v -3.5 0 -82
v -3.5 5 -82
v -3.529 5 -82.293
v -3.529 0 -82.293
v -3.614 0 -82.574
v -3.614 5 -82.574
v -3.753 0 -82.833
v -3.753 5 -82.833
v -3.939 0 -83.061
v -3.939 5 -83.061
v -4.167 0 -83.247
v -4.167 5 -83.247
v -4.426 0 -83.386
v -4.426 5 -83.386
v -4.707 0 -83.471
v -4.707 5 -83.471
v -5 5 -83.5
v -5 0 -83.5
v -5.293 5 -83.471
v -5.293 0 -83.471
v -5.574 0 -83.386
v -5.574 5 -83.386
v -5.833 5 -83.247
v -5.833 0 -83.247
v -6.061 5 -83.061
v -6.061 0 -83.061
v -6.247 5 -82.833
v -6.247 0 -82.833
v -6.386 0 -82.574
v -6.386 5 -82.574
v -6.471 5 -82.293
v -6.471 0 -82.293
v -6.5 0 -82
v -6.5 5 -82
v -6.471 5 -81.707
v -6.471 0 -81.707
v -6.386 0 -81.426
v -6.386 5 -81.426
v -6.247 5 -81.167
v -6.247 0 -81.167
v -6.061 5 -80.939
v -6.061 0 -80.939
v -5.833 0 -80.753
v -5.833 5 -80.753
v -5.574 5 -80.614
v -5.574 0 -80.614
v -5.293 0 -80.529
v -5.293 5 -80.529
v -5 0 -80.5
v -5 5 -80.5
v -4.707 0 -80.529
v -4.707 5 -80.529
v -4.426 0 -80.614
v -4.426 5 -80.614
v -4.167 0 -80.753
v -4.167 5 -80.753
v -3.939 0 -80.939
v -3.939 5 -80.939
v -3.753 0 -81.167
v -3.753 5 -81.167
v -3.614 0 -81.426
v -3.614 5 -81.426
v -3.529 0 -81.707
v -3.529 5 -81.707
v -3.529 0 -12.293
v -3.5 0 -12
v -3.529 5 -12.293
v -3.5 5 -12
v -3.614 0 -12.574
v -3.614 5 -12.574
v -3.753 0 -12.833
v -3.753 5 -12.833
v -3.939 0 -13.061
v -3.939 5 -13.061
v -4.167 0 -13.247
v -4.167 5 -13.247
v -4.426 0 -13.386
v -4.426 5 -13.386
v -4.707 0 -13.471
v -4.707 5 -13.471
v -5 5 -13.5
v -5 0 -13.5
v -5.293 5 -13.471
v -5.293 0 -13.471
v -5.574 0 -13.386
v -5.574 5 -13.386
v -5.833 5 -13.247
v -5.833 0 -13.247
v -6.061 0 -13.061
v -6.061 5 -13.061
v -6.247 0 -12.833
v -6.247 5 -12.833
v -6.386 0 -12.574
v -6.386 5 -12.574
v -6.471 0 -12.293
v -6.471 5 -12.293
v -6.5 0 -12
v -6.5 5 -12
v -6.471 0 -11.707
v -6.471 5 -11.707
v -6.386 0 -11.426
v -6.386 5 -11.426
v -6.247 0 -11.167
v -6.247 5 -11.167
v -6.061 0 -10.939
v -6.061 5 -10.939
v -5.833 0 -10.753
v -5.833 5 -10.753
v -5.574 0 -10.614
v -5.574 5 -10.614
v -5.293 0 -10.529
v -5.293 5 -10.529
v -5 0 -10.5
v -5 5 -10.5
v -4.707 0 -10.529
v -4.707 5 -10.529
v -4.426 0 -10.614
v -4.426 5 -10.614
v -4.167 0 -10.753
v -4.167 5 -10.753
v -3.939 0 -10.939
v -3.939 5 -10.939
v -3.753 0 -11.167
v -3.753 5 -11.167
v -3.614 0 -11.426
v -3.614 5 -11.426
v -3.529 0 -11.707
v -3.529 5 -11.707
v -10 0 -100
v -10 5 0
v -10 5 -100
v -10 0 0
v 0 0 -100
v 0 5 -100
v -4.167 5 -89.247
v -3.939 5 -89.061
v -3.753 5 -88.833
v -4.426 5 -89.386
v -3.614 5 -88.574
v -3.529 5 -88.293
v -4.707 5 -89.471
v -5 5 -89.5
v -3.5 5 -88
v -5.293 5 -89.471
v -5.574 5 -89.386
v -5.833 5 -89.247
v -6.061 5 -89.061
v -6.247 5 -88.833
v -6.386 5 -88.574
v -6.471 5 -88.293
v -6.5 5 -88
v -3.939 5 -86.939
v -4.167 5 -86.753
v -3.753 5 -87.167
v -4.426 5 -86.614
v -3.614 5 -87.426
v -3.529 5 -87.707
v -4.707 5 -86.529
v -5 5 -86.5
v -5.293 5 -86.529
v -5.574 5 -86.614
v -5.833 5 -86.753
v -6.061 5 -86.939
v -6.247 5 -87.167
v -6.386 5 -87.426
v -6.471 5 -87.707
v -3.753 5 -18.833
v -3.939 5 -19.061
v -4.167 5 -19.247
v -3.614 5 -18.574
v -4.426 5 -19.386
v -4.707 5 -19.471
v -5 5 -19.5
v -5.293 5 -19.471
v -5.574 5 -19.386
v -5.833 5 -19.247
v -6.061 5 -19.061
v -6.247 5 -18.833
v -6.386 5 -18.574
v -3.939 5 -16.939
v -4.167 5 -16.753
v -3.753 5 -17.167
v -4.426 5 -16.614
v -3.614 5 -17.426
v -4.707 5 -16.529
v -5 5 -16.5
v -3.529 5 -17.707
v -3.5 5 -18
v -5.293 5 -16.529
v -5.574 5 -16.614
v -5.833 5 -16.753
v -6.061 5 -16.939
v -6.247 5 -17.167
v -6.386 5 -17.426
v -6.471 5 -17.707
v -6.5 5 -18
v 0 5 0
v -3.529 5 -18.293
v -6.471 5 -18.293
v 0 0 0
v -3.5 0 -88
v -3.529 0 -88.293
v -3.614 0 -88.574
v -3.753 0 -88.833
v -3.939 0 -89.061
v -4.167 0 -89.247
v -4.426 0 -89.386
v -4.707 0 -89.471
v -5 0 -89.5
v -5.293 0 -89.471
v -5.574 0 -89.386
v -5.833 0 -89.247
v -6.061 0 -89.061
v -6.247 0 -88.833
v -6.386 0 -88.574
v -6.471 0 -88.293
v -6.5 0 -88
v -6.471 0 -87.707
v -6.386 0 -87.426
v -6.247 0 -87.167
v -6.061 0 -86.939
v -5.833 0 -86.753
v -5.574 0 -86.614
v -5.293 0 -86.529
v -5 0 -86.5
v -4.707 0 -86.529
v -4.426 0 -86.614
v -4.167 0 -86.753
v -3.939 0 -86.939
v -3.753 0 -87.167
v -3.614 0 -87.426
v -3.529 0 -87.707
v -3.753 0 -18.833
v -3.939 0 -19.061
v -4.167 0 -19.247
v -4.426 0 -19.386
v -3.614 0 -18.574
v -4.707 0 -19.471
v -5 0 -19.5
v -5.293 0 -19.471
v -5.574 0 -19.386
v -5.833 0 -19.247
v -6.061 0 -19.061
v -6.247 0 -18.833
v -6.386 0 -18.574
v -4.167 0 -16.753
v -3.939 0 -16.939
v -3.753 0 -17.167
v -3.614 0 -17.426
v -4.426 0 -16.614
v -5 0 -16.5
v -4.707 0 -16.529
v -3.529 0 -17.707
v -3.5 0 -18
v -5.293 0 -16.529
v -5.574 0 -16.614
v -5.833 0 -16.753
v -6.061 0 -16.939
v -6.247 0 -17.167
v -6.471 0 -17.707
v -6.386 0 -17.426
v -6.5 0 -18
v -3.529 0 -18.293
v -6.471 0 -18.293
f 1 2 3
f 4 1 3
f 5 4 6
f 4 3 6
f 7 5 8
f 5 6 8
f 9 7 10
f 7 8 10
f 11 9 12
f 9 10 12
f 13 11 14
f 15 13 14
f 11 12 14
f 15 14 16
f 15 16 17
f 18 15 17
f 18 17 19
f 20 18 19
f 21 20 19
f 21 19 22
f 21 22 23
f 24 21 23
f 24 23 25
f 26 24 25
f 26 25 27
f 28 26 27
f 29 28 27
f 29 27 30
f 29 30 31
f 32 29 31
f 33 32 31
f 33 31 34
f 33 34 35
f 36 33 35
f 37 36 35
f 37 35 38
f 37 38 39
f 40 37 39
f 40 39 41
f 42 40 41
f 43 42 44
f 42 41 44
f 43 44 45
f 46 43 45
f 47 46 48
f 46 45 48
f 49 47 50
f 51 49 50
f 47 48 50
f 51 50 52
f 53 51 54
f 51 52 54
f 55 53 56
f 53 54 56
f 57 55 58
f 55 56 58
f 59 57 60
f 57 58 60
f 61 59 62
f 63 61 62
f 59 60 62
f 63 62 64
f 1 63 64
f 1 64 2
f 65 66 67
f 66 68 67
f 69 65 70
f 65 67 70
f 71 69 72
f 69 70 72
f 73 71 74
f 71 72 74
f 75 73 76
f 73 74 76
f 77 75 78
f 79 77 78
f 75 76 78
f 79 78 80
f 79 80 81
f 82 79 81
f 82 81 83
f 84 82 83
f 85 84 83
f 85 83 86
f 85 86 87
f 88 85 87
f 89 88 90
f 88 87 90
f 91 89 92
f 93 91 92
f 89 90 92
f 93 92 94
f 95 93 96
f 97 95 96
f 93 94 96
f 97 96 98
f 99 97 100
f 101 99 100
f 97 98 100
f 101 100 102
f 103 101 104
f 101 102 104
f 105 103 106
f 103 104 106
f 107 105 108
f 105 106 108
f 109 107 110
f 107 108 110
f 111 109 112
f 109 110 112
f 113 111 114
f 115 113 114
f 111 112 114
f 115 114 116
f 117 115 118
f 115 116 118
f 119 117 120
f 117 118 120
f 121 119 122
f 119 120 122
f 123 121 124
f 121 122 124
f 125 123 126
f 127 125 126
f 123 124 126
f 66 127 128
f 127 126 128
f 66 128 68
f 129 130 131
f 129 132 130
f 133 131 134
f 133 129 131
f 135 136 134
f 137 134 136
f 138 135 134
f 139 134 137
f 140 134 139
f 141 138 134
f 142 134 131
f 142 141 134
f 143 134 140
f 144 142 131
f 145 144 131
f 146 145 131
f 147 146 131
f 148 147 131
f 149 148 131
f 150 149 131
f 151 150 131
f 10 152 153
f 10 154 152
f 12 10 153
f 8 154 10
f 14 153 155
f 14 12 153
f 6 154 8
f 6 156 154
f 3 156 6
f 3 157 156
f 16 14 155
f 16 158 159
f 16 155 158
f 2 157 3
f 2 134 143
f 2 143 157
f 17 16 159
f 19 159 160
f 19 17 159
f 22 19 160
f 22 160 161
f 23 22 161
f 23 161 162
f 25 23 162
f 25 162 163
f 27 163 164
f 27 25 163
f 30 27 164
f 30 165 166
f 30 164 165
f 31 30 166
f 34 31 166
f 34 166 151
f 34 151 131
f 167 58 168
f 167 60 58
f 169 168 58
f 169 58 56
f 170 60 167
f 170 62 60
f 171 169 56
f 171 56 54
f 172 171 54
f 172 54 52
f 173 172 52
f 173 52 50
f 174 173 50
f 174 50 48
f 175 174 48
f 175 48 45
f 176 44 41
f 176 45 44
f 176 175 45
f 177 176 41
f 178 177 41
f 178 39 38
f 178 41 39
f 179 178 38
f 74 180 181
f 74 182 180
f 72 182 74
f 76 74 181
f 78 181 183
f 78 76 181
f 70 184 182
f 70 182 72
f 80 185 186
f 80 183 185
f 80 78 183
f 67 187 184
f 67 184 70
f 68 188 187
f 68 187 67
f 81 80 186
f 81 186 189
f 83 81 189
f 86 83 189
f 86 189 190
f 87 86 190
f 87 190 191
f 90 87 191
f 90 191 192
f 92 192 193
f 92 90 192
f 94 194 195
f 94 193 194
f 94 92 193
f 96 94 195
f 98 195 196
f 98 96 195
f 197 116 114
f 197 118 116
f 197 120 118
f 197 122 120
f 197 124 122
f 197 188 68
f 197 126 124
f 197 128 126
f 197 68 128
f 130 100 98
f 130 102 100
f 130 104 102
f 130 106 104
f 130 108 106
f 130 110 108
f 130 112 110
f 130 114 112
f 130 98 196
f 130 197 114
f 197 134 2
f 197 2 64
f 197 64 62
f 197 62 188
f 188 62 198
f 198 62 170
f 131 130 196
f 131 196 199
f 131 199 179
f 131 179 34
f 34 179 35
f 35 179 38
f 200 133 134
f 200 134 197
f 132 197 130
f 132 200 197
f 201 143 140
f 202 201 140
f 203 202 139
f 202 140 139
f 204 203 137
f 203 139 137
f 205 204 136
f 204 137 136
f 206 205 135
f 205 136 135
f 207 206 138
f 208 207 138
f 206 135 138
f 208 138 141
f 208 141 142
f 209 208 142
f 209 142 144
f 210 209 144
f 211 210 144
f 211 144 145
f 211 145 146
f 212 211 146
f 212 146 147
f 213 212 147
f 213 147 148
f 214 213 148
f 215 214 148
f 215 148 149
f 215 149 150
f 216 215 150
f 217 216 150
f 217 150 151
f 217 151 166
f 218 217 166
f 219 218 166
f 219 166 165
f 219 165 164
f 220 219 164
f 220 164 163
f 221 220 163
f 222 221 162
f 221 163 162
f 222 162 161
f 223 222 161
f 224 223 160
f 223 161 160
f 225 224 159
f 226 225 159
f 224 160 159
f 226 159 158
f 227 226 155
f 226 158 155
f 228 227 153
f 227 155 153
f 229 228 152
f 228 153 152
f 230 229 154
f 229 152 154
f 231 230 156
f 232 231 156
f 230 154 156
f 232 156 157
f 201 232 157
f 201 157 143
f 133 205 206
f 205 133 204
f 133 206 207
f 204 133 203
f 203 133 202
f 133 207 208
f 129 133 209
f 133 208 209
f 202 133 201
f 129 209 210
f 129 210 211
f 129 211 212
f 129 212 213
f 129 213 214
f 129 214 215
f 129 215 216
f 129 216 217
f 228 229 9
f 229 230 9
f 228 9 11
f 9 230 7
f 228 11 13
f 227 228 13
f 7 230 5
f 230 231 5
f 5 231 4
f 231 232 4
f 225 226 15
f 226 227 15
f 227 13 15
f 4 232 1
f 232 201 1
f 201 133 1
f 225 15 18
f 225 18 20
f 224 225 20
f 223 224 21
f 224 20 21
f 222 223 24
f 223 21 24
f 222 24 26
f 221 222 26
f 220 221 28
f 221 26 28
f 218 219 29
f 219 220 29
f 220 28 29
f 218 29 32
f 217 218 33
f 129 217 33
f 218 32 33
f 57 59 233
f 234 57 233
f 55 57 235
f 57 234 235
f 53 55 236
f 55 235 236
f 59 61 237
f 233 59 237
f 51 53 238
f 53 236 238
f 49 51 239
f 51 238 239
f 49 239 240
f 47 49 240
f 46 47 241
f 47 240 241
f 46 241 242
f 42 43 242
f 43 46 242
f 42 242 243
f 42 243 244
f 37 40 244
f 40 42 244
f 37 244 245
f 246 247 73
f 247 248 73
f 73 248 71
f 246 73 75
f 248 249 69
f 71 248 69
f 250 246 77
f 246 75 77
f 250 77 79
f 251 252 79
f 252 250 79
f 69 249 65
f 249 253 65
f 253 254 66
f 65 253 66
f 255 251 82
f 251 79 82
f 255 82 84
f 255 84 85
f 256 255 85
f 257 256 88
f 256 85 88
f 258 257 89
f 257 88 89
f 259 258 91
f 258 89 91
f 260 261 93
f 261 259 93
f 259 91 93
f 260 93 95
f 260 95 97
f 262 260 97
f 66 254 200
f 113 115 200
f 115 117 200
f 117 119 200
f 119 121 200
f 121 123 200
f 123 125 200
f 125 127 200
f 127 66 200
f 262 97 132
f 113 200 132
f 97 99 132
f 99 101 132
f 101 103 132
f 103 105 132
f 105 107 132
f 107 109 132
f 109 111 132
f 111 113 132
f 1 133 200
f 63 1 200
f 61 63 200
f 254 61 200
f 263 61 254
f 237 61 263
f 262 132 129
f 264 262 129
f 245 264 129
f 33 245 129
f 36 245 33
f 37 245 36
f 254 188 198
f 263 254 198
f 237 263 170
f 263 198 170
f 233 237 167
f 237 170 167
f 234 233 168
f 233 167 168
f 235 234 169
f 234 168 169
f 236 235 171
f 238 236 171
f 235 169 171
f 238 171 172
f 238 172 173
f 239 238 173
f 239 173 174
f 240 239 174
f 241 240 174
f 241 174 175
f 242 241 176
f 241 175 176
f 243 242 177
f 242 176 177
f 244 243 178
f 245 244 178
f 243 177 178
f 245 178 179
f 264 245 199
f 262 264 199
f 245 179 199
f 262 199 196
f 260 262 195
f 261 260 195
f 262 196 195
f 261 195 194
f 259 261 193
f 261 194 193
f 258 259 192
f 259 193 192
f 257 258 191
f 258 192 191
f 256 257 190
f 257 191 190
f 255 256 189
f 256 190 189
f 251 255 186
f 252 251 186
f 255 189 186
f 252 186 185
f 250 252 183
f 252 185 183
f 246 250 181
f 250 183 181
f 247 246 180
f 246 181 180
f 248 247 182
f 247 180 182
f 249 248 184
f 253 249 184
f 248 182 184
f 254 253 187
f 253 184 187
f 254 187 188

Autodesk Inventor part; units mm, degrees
ref_plane "YZ Plane" through (0, 0, 0) normal (1, 0, 0) x (0, 1, 0)
ref_plane "XZ Plane" through (0, 0, 0) normal (0, 1, 0) x (-1, 0, 0)
ref_plane "XY Plane" through (0, 0, 0) normal (0, 0, 1) x (1, 0, 0)
sketch "Sketch1" plane through (0, 0, 0) normal (0, 1, 0) x (-1, 0, 0)
  line L0 (0, 0) -> (10, 0)
  line L1 (10, 0) -> (10, -100)
  line L2 (10, -100) -> (0, -100)
  line L3 (0, -100) -> (0, 0)
  dimension "d0" = 10
  dimension "d1" = 100
extrude "Extrusion1" add sketch "Sketch1" along normal blind 5
sketch "Sketch2" plane through (0, 5, 0) normal (0, 1, 0) x (1, 0, 0)
  circle A0 centre (-5, 12) radius 1.5
  line L0 (0, 0) -> (0, 100) projected
  line L1 (-10, 0) -> (0, 0) projected
  circle A1 centre (-5, 18) radius 1.5
  line L2 (0, 0) -> (0, 50)
  circle A2 centre (-5, 88) radius 1.5
  circle A3 centre (-5, 82) radius 1.5
  dimension "d4" = 3
  dimension "d8" = 5
  dimension "d9" = 12
  dimension "d12" = 3
  dimension "d13" = 6
  dimension "d14" = 0
  dimension "d15" = 50
extrude "Extrusion2" cut sketch "Sketch2" against normal through all
properties part number "Soporte2_Dos"
